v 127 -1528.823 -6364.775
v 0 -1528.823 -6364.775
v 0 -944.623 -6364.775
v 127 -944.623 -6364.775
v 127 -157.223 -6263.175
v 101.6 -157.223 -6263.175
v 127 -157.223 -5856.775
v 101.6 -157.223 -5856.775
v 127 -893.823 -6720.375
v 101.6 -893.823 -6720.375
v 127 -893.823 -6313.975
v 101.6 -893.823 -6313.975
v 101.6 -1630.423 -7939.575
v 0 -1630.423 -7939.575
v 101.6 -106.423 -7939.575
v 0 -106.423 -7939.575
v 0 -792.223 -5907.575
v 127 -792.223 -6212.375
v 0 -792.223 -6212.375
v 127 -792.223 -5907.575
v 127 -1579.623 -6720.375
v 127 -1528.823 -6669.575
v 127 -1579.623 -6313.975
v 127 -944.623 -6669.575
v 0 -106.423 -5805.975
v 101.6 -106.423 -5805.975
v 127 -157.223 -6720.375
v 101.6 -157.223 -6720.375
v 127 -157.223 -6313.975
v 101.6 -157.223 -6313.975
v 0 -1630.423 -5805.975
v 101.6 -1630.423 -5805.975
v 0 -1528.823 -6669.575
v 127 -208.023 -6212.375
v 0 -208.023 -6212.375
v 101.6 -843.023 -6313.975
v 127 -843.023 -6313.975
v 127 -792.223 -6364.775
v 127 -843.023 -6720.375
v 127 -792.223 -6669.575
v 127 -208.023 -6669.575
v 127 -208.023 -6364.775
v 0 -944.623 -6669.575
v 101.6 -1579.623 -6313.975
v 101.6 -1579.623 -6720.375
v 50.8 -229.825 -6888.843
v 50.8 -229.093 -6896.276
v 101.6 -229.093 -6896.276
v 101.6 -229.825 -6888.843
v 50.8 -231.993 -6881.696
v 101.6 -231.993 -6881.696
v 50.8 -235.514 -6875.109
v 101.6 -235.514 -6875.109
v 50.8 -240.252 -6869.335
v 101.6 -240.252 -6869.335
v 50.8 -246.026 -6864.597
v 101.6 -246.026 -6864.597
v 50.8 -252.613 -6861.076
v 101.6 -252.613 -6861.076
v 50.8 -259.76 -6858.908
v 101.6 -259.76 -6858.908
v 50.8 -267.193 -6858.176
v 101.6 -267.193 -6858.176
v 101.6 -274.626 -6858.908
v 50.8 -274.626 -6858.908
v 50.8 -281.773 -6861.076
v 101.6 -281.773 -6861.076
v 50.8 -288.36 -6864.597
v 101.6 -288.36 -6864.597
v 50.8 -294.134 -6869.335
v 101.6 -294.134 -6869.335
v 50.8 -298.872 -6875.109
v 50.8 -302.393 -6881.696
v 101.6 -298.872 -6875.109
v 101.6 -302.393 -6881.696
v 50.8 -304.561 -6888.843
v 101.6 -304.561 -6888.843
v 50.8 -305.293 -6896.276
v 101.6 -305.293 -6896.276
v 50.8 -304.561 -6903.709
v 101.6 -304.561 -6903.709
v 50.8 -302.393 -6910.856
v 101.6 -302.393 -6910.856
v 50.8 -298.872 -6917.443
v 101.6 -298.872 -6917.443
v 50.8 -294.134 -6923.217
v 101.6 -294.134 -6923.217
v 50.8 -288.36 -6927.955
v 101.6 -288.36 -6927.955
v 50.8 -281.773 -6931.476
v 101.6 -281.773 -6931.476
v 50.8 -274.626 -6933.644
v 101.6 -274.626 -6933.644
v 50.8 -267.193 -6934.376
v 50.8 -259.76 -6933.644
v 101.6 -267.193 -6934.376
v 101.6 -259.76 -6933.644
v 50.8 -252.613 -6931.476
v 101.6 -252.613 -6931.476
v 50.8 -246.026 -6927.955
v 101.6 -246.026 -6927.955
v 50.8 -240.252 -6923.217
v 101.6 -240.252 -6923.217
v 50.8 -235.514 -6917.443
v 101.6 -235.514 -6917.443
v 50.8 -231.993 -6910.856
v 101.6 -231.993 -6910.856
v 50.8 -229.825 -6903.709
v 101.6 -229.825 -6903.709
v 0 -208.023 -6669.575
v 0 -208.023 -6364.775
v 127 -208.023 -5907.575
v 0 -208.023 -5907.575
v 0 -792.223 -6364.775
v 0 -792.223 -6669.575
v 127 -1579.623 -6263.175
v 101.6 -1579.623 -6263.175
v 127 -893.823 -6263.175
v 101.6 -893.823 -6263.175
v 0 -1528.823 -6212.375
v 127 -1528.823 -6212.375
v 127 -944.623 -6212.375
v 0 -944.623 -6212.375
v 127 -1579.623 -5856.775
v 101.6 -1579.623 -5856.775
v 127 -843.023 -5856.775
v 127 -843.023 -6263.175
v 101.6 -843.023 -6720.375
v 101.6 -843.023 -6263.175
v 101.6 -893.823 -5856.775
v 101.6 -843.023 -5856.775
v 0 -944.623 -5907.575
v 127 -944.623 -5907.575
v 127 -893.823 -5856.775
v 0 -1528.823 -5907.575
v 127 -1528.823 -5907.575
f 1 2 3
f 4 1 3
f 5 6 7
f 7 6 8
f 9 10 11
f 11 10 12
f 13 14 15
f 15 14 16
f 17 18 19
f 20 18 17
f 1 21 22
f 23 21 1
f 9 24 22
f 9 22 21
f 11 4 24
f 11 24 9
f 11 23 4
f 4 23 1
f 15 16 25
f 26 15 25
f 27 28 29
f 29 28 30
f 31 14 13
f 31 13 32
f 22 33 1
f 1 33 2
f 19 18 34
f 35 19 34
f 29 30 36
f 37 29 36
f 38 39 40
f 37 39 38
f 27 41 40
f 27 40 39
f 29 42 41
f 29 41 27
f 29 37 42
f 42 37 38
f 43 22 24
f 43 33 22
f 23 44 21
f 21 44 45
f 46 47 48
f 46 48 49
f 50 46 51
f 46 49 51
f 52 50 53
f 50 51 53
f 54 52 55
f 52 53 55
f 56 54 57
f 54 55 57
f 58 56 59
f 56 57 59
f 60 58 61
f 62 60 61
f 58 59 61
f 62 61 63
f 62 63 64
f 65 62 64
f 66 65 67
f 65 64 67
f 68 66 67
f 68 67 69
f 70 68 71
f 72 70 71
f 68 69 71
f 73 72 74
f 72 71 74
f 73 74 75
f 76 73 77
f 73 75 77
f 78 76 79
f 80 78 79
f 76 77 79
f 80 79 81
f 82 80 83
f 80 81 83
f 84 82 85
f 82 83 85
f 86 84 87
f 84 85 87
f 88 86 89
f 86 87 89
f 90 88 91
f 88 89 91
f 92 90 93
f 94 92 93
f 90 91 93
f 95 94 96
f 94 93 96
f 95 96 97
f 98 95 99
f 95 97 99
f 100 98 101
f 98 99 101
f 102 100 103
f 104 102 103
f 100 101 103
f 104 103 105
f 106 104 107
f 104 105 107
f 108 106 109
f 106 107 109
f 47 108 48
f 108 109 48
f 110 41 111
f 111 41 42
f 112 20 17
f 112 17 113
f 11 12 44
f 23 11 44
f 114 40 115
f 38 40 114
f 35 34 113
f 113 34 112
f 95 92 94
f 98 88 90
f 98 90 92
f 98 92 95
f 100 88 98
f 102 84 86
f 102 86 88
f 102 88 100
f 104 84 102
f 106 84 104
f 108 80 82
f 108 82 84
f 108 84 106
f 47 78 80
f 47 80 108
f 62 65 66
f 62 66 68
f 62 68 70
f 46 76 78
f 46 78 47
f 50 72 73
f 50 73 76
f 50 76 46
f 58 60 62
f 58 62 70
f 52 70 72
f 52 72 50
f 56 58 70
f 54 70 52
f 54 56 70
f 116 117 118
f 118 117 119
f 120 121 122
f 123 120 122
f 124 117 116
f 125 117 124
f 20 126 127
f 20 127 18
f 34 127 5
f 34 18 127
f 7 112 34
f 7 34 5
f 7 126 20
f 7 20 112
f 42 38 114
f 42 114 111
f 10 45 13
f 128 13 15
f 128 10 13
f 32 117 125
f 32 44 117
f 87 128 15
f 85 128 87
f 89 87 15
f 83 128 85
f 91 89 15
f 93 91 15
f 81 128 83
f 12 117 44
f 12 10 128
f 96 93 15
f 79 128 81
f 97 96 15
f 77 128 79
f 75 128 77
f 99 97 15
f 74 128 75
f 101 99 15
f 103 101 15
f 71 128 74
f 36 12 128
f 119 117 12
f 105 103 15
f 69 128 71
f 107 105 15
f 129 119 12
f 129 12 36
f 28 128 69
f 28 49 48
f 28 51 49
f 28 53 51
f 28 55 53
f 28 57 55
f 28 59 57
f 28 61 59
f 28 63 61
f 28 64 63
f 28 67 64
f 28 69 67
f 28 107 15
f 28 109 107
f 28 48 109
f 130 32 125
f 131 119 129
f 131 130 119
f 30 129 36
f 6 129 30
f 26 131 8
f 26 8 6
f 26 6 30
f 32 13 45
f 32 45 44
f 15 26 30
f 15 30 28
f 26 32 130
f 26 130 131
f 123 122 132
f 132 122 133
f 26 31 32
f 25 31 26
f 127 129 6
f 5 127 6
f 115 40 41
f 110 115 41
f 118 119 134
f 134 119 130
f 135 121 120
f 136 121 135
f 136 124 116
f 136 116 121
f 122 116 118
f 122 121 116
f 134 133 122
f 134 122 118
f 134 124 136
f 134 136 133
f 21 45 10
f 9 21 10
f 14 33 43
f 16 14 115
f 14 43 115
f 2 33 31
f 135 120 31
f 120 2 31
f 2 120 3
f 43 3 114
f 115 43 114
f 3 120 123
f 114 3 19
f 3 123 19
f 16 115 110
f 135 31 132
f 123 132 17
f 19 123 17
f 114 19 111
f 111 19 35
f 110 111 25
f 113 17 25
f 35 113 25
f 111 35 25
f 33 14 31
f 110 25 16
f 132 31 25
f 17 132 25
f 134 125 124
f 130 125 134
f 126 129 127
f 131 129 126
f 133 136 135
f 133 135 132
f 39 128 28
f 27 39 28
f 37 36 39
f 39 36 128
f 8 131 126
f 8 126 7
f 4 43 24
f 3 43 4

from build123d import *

# Parameters (mm, degrees)
F0_W     = 1524
F0_H     = 2133.6
F1_DEPTH = 101.6
F2_R     = 38.1
F3_DEPTH = 50.8
F2_W     = 584.2
F2_H     = 304.8
F4_DEPTH = 101.601
F2_W_2   = 685.8
F2_H_2   = 406.4
F5_DEPTH = 25.4


with BuildPart() as f1:
    # F0 (on Right) → F1 (new body)
    with BuildSketch(Plane.YZ):
        with Locations((-868.423025, -6872.774788)):
            Rectangle(F0_W, F0_H)
    extrude(amount=F1_DEPTH)

    # F2 (on face) → F3 (cut)
    with BuildSketch(Plane.YZ.offset(101.6)):
        with Locations((-267.193135, -6896.276238)):
            Circle(F2_R)
    extrude(amount=-F3_DEPTH, mode=Mode.SUBTRACT)

    # F2 (on face) → F4 (cut, through all)
    with BuildSketch(Plane.YZ.offset(101.6)):
        with Locations((-500.123025, -6059.974788)):
            Rectangle(F2_W, F2_H)
        with Locations((-1236.723025, -6059.974788)):
            Rectangle(F2_W, F2_H)
        with Locations((-1236.723025, -6517.174788)):
            Rectangle(F2_W, F2_H)
        with Locations((-500.123025, -6517.174788)):
            Rectangle(F2_W, F2_H)
    extrude(amount=-F4_DEPTH, mode=Mode.SUBTRACT)

    # F2 (on face) → F5 (join)
    with BuildSketch(Plane.YZ.offset(101.6)):
        Polygon((-893.823025, -6313.974788), (-1579.623025, -6313.974788), (-1579.623025, -6720.374788), (-1528.823025, -6720.374788), (-893.823025, -6720.374788), align=None)
        with Locations((-1236.723025, -6517.174788)):
            Rectangle(F2_W, F2_H, mode=Mode.SUBTRACT)
        with Locations((-1236.723025, -6059.974788)):
            Rectangle(F2_W_2, F2_H_2)
        with Locations((-1236.723025, -6059.974788)):
            Rectangle(F2_W, F2_H, mode=Mode.SUBTRACT)
        Polygon((-843.023025, -6313.974788), (-843.023025, -6720.374788), (-208.023025, -6720.374788), (-157.223025, -6720.374788), (-157.223025, -6313.974788), align=None)
        with Locations((-500.123025, -6517.174788)):
            Rectangle(F2_W, F2_H, mode=Mode.SUBTRACT)
        with Locations((-500.123025, -6059.974788)):
            Rectangle(F2_W_2, F2_H_2)
        with Locations((-500.123025, -6059.974788)):
            Rectangle(F2_W, F2_H, mode=Mode.SUBTRACT)
    extrude(amount=F5_DEPTH)


solid = f1.part
